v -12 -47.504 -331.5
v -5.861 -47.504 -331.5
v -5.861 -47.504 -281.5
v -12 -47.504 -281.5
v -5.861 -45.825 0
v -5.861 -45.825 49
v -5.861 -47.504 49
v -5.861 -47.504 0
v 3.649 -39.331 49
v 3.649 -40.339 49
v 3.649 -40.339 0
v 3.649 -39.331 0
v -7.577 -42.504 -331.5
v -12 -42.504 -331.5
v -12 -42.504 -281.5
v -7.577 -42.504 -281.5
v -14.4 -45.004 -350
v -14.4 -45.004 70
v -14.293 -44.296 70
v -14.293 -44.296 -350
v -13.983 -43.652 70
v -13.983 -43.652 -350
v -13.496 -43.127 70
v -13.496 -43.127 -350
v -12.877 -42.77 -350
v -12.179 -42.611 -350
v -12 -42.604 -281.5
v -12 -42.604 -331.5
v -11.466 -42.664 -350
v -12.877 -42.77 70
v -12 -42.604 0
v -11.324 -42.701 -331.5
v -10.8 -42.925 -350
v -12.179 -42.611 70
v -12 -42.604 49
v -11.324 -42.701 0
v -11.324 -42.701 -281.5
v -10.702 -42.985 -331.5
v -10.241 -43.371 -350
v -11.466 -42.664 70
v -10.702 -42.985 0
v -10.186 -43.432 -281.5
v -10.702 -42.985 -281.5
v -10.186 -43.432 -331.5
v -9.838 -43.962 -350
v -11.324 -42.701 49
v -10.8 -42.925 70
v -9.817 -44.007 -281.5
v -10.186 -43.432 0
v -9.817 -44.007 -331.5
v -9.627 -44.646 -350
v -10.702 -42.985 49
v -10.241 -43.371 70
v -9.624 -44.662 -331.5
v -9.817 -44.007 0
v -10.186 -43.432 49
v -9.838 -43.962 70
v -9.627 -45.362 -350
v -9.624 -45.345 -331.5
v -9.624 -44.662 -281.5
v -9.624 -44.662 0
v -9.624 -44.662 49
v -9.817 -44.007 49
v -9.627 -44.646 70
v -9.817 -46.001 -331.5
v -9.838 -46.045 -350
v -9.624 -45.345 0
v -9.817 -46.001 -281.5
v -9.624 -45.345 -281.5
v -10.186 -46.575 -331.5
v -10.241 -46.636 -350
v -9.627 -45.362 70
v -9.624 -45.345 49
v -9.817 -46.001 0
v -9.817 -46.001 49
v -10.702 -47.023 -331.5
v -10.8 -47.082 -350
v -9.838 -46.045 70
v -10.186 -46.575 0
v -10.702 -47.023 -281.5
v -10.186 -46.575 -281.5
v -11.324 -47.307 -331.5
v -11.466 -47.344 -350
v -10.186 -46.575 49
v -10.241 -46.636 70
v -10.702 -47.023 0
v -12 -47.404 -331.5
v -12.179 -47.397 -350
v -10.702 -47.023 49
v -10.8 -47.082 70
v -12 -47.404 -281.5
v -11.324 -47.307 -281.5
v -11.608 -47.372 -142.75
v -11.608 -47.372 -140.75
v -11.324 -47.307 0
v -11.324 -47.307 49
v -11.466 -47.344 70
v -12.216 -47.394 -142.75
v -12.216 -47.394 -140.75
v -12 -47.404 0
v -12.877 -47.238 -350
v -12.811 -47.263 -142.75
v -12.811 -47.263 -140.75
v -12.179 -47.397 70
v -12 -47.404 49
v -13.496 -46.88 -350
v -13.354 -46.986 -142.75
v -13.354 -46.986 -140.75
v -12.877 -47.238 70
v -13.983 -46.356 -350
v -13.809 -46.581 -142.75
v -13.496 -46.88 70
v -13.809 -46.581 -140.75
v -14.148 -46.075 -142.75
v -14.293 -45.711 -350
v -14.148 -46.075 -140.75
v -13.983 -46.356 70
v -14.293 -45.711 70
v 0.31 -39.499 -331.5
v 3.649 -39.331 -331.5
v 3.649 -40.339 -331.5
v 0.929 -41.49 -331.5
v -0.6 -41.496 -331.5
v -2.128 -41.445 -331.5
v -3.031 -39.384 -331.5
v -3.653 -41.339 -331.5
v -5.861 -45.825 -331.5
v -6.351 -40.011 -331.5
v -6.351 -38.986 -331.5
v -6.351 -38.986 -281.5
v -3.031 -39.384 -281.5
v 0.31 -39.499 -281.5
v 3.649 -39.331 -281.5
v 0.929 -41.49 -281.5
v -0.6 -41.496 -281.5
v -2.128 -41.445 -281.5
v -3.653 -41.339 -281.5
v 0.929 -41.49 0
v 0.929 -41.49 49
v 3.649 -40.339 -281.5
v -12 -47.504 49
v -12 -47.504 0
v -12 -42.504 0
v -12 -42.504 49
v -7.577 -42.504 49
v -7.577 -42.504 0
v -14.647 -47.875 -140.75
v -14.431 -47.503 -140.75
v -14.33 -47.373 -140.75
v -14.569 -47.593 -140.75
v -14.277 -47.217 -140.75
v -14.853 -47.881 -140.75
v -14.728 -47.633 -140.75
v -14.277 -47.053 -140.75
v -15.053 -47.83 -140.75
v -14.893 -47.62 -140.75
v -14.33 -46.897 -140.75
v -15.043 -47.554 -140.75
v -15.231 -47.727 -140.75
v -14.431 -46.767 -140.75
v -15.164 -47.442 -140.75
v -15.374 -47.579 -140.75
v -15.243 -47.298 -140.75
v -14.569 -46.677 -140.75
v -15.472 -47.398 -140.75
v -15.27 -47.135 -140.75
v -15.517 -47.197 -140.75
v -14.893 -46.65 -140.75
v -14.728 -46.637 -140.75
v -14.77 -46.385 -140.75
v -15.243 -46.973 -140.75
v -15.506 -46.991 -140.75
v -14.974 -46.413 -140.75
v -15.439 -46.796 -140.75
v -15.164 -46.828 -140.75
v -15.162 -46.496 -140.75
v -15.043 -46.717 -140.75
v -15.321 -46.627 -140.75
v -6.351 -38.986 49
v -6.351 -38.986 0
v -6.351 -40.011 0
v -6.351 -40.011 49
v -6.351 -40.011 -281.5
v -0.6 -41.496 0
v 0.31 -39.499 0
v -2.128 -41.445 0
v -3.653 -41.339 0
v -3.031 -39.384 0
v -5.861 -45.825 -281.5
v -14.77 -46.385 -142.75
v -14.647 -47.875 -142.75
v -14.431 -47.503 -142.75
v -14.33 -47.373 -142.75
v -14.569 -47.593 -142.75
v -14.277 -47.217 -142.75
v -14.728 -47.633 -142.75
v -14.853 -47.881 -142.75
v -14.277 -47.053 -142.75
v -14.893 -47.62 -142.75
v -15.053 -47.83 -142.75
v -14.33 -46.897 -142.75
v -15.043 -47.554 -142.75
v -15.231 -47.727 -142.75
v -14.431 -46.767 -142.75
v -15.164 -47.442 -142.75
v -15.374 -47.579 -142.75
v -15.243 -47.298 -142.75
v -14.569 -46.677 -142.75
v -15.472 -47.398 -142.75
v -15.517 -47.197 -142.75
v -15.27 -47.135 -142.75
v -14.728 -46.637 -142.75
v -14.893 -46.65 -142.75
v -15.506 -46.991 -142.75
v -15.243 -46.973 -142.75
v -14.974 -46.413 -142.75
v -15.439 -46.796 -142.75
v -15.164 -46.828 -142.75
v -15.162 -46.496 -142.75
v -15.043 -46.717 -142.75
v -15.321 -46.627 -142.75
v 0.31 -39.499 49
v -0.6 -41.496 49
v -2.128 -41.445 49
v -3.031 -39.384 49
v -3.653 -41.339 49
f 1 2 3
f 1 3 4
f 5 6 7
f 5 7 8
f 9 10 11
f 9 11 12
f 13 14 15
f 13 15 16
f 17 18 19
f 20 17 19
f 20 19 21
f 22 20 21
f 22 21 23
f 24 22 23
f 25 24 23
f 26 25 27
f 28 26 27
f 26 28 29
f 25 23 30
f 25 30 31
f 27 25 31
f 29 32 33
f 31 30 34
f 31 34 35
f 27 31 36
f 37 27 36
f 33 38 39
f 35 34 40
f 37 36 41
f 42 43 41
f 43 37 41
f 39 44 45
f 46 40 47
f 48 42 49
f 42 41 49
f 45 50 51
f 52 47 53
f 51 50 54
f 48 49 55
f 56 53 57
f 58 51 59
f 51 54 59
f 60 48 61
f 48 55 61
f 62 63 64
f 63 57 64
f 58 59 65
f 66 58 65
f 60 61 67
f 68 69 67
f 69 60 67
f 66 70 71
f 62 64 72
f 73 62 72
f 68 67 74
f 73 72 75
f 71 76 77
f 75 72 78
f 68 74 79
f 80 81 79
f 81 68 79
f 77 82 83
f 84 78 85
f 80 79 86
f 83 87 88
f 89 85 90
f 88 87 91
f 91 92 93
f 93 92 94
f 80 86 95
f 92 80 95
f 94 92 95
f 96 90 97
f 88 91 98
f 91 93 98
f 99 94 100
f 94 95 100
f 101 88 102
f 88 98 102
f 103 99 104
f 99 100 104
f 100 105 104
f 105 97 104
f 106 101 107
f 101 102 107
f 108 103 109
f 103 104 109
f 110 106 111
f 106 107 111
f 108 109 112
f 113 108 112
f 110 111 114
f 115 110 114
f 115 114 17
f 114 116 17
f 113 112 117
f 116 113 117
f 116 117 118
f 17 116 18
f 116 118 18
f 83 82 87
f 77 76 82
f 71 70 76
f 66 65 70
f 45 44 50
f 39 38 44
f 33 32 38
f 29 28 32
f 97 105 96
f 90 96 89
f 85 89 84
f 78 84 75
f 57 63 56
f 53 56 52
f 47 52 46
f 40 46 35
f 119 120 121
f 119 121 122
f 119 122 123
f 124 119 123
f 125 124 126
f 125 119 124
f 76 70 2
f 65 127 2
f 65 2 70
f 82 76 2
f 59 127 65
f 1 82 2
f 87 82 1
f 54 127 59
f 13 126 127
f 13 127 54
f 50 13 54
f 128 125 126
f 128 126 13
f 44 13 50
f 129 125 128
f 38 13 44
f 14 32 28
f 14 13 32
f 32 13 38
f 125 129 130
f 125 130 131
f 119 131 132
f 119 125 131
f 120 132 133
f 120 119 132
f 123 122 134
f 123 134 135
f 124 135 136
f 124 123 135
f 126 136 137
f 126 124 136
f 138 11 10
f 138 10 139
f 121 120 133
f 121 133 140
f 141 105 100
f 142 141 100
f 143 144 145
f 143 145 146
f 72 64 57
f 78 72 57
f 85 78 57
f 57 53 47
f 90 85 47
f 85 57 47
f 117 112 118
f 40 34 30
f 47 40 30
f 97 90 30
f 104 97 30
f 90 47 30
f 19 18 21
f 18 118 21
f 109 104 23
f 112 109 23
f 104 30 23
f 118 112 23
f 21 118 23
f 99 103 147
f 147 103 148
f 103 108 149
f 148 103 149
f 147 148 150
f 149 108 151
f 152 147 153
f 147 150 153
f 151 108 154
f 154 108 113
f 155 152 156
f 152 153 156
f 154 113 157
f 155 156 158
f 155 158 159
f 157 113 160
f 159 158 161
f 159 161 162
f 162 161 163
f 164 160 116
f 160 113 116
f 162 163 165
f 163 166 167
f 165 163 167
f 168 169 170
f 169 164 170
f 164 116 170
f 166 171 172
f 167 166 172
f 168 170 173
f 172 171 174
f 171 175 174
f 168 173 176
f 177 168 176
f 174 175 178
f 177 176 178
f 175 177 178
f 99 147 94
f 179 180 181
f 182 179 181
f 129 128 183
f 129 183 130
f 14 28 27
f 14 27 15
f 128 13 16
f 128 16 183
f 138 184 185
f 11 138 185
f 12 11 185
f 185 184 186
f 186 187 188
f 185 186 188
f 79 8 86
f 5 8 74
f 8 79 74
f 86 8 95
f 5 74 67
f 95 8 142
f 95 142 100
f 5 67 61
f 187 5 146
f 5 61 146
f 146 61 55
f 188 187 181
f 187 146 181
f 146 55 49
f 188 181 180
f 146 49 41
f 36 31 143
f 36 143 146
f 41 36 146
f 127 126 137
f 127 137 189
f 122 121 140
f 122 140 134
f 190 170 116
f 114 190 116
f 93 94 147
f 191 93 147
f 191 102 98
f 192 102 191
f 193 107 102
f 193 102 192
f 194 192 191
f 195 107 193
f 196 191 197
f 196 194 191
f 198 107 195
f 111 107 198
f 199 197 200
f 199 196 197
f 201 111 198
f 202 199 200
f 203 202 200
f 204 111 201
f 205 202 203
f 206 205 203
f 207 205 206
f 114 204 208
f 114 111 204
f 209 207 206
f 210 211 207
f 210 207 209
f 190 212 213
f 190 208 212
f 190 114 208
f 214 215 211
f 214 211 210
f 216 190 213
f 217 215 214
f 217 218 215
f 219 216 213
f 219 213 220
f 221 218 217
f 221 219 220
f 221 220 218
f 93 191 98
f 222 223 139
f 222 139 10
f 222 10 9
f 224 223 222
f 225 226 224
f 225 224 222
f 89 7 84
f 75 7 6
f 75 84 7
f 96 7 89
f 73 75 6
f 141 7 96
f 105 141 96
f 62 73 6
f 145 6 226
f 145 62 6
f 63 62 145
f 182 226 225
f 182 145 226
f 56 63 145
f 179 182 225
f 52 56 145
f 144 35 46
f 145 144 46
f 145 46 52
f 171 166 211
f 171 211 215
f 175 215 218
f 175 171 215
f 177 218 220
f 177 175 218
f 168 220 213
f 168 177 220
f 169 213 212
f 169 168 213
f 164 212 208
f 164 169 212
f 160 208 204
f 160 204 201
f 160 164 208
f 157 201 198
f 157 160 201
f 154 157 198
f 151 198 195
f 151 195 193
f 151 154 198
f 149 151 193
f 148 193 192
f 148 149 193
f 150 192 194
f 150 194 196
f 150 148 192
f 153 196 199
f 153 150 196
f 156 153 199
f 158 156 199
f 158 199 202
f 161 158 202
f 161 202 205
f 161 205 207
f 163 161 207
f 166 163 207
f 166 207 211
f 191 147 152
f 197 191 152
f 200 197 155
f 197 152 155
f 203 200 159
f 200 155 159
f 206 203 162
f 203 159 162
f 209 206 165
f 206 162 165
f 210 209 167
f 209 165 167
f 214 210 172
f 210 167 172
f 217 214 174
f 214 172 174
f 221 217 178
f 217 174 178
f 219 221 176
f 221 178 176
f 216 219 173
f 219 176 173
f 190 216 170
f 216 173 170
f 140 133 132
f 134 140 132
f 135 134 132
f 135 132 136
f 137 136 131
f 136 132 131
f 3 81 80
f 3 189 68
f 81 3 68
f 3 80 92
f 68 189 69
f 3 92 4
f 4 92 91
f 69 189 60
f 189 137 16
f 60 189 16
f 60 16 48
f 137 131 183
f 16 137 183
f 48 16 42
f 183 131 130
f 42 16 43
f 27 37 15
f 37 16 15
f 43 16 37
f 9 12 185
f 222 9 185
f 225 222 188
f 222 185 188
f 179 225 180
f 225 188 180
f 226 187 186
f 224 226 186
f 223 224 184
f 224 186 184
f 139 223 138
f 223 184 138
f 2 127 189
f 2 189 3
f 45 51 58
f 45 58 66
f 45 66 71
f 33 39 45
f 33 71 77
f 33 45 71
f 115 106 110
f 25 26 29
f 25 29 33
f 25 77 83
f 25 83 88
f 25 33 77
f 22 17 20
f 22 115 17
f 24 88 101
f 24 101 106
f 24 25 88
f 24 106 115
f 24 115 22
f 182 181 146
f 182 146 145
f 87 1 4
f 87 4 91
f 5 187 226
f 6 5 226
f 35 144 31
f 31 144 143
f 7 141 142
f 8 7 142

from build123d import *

# Parameters (mm, degrees)
BOSS_EXTRUDE1_DEPTH      = 49
CHAMFER1_SIZE            = 1
CHAMFER2_SIZE            = 1
SKETCH4_W                = 3.006754005
SKETCH4_H                = 49
BOSS_EXTRUDE2_DEPTH      = 5
SKETCH5_W                = 49
SKETCH5_H                = 5
BOSS_EXTRUDE3_DEPTH      = 6.139242
BOSS_EXTRUDE4_DEPTH      = 350
BOSS_EXTRUDE4_DEPTH_BACK = 70
SKETCH6_R                = 2.4
BOSS_EXTRUDE5_START      = 50
BOSS_EXTRUDE5_DEPTH      = 50
SKETCH11_R               = 0.5
BOSS_EXTRUDE9_DEPTH      = 2


with BuildPart() as part:
    # Sketch1 → Boss-Extrude1 (new body)
    with BuildSketch(Plane.XY):
        with BuildLine():
            Line((-6.350615501, -38.986147319), (-6.350615501, -41.01121411))
            ThreePointArc((-6.350615501, -41.01121411), (-1.360537007, -41.477692065), (3.649384499, -41.339230675))
            Line((3.649384499, -41.339230675), (3.649384499, -39.331056339))
            ThreePointArc((3.649384499, -39.331056339), (-1.361580989, -39.476525901), (-6.350615501, -38.986147319))
        make_face()
    extrude(amount=BOSS_EXTRUDE1_DEPTH)

    # Chamfer1
    # the kernel refuses this chamfer: 3, 1 mm, written as the material it takes off along each edge
    with BuildSketch(Plane(origin=(3.649384499, -41.339230675, -7.093753287), x_dir=(0, 1, 0), z_dir=(0, 0, 1))) as chamfer1_piece_1:
        with BuildLine():
            Line((CHAMFER1_SIZE, 0), (-0.150364113, 2.720124405))
            ThreePointArc((-0.150364113, 2.720124405), (-0.100586913, 1.415213895), (0, 0))
            Line((0, 0), (CHAMFER1_SIZE, 0))
        make_face()
    extrude(amount=63.187506575, mode=Mode.SUBTRACT)

    # Chamfer2
    # the kernel refuses this chamfer: 3, 1 mm, written as the material it takes off along each edge
    with BuildSketch(Plane(origin=(-6.350615501, -41.01121411, -7.077780992), x_dir=(0.992702552846142, -0.12058872904526673, 0), z_dir=(0, 0, 1))) as chamfer2_piece_1:
        with BuildLine():
            Line((2.717564067, 0), (-CHAMFER2_SIZE * 0.120588729045, CHAMFER2_SIZE * 0.992702552846))
            Line((-CHAMFER2_SIZE * 0.120588729045, CHAMFER2_SIZE * 0.992702552846), (0, 0))
            ThreePointArc((0, 0), (1.415420862, -0.022211756), (2.717564067, 0))
        make_face()
    extrude(amount=63.155561983, mode=Mode.SUBTRACT)

    # Sketch4 → Boss-Extrude2 (add)
    with BuildSketch(Plane(origin=(-17.090415502, -34.725548264, 0), x_dir=(0.8972243095002063, -0.44157506546665215, 0), z_dir=(-0.44157506546665215, -0.8972243095002063, 0))):
        with Locations((13.473404886, 24.5)):
            Rectangle(SKETCH4_W, SKETCH4_H)
    extrude(amount=BOSS_EXTRUDE2_DEPTH)

    # Sketch5 → Boss-Extrude3 (add)
    with BuildSketch(Plane(origin=(-12, 0, 0), x_dir=(0, 0, -1), z_dir=(1, 0, 0))):
        with Locations((-24.5, -45.003805325)):
            Rectangle(SKETCH5_W, SKETCH5_H)
    extrude(amount=BOSS_EXTRUDE3_DEPTH)

    # Sketch6 → Boss-Extrude4 (add, two sides: drawn at the far end of the back side and taken through both)
    with BuildSketch(Plane(origin=(0, 0, 0), x_dir=(-1, 0, 0), z_dir=(0, 0, -1)).offset(-BOSS_EXTRUDE4_DEPTH_BACK)):
        with Locations((12, -45.003805325)):
            Circle(SKETCH6_R)
    extrude(amount=BOSS_EXTRUDE4_DEPTH + BOSS_EXTRUDE4_DEPTH_BACK)

    # Sketch8 → Boss-Extrude5 (add)
    with BuildSketch(Plane(origin=(0, 0, -281.5), x_dir=(-1, 0, 0), z_dir=(0, 0, -1)).offset(BOSS_EXTRUDE5_START)):
        with BuildLine():
            Line((12, -47.503805325), (12, -47.403805325))
            ThreePointArc((12, -47.403805325), (9.6, -45.003805325), (12, -42.603805325))
            Line((12, -42.603805325), (12, -42.503805325))
            Line((12, -42.503805325), (7.577361274, -42.503805325))
            Line((7.577361274, -42.503805325), (6.350615501, -40.01121411))
            Line((6.350615501, -40.01121411), (6.350615501, -38.986147319))
            ThreePointArc((6.350615501, -38.986147319), (1.361580989, -39.476525901), (-3.649384499, -39.331056339))
            Line((-3.649384499, -39.331056339), (-3.649384499, -40.339230675))
            Line((-3.649384499, -40.339230675), (-0.929260095, -41.489594788))
            ThreePointArc((-0.929260095, -41.489594788), (1.363893558, -41.477581829), (3.652882714, -41.338921707))
            Line((3.652882714, -41.338921707), (5.860758041, -45.825043254))
            Line((5.860758041, -45.825043254), (5.860758041, -47.503805325))
            Line((5.860758041, -47.503805325), (12, -47.503805325))
        make_face()
    extrude(amount=-BOSS_EXTRUDE5_DEPTH)

    # Sketch11 → Boss-Extrude9 (add)
    with BuildSketch(Plane(origin=(0, 0, -140.75), x_dir=(-1, 0, 0), z_dir=(0, 0, -1))):
        with BuildLine():
            Line((14.769764267, -46.385196028), (14.147707084, -46.074951572))
            ThreePointArc((14.147707084, -46.074951572), (13.091170315, -47.141408503), (11.607713099, -47.371528068))
            Line((11.607713099, -47.371528068), (14.647174611, -47.875109386))
            ThreePointArc((14.647174611, -47.875109386), (15.517238353, -47.196697988), (14.769764267, -46.385196028))
        make_face()
        with Locations((14.769764267, -47.135196028)):
            Circle(SKETCH11_R, mode=Mode.SUBTRACT)
    extrude(amount=BOSS_EXTRUDE9_DEPTH)


solid = part.part
